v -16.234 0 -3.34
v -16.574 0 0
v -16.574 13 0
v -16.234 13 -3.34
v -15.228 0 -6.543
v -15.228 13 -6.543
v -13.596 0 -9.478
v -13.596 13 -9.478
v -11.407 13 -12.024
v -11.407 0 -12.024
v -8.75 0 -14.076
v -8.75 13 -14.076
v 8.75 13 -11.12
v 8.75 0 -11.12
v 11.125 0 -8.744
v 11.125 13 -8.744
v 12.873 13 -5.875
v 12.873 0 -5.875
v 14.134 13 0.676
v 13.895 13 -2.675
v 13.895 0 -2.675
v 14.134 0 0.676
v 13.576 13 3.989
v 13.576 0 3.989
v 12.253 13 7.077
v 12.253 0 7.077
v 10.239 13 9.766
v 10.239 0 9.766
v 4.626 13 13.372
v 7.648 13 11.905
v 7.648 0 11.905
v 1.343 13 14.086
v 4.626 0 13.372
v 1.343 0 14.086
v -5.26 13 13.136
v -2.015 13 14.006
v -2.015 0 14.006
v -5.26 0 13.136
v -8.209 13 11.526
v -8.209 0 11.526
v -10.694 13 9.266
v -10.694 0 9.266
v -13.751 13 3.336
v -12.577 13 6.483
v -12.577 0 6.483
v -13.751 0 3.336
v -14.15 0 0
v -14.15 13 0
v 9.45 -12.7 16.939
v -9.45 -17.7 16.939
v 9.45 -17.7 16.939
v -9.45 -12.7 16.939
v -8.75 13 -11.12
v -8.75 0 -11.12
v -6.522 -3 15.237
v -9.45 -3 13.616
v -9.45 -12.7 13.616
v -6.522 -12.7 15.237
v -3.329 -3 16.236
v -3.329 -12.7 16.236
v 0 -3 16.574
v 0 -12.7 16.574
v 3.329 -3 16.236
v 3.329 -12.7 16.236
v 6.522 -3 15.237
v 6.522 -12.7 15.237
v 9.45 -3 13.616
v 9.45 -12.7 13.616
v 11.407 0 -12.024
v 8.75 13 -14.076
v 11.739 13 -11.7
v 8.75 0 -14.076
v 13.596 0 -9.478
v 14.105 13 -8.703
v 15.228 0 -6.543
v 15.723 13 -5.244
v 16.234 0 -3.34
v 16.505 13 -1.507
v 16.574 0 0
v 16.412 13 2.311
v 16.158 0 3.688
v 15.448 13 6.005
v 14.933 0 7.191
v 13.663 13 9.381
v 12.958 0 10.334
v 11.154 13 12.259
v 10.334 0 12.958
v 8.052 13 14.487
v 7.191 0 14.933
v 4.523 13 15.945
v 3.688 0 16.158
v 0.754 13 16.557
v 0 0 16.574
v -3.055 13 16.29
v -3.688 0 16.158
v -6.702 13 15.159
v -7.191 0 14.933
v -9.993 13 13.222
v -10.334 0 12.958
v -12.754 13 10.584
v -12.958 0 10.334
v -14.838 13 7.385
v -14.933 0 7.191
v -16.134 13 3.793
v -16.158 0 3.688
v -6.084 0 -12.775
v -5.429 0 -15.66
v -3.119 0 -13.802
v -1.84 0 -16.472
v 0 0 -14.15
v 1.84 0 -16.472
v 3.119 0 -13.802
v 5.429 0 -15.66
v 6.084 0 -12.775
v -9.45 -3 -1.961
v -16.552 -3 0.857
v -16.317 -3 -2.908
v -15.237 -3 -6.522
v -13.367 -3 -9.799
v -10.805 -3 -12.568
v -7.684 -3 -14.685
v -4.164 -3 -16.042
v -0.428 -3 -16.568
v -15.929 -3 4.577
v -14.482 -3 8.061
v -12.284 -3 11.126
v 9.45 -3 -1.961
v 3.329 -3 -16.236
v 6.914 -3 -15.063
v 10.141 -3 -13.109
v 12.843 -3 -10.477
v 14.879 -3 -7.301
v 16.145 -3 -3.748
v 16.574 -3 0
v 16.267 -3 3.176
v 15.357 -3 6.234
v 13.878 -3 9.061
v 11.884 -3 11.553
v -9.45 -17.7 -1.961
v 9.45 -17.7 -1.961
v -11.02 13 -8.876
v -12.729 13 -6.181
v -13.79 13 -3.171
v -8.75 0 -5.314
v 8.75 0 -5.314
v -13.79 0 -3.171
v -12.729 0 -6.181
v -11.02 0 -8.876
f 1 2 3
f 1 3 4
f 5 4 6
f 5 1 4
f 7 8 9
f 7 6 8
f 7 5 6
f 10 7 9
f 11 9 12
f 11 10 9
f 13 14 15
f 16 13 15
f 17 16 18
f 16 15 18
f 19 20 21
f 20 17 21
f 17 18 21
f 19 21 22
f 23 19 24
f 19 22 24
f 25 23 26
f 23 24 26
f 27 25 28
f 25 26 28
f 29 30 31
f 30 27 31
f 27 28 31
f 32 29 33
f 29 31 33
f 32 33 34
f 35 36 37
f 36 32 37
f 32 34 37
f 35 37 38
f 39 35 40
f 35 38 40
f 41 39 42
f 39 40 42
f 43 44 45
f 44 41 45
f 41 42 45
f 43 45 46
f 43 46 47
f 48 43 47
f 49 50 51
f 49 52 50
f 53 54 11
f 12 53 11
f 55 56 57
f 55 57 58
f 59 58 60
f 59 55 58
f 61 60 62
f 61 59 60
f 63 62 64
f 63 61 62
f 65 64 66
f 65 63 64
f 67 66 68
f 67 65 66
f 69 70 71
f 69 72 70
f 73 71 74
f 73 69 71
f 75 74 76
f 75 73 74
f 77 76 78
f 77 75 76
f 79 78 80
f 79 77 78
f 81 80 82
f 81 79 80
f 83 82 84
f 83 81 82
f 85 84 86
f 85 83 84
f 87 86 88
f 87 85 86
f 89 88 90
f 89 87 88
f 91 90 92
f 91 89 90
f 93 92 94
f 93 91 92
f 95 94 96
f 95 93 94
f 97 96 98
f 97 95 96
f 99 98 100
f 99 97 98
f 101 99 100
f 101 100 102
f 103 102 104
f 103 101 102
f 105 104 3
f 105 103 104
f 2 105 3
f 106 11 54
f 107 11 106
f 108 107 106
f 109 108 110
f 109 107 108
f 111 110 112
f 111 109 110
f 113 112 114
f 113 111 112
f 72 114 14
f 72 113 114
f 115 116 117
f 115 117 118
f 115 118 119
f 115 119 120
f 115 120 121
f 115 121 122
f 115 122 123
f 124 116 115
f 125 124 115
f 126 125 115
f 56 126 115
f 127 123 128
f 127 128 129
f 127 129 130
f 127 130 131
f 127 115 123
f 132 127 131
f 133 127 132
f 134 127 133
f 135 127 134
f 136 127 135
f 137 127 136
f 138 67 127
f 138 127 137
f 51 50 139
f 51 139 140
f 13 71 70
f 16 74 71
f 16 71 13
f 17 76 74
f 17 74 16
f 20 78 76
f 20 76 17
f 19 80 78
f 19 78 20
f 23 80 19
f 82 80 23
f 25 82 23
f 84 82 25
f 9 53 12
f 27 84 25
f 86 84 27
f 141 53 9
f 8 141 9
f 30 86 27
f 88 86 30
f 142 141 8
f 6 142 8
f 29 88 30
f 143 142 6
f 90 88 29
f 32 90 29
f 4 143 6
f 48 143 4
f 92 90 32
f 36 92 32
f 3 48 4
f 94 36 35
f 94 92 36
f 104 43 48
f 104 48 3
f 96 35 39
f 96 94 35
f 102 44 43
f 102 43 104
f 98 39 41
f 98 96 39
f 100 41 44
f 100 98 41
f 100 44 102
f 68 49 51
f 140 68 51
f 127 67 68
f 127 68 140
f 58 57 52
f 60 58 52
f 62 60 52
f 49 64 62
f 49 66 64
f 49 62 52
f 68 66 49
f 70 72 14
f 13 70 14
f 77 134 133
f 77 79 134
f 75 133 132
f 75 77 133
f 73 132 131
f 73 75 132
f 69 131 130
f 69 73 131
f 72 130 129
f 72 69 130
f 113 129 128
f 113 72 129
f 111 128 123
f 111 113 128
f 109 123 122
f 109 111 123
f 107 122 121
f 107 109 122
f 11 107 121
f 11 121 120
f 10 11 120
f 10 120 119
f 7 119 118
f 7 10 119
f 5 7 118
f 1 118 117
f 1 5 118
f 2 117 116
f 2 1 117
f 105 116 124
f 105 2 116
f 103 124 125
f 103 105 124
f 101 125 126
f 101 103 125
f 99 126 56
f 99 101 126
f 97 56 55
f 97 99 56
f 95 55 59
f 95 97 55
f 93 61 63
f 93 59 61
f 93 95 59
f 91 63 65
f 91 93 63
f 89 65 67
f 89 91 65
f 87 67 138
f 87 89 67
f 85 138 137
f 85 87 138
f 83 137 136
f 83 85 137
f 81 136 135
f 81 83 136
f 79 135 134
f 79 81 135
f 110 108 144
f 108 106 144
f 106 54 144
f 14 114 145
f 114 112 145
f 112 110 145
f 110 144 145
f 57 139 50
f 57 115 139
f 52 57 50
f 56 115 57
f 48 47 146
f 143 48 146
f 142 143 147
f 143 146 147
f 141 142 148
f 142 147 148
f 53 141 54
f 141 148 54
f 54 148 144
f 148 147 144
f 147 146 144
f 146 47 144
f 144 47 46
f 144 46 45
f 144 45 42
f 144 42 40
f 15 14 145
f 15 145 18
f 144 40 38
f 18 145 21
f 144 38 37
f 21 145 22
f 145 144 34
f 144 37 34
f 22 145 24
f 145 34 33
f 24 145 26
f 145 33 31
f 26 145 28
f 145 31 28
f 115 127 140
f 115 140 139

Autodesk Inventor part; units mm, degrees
ref_plane "YZ Plane" through (0, 0, 0) normal (1, 0, 0) x (0, 1, 0)
ref_plane "XZ Plane" through (0, 0, 0) normal (0, 1, 0) x (-1, 0, 0)
ref_plane "XY Plane" through (0, 0, 0) normal (0, 0, 1) x (1, 0, 0)
sketch "Sketch1" plane through (0, 0, 0) normal (0, 1, 0) x (-1, 0, 0)
  circle A0 centre (0, 0) radius 14.15
  circle A1 centre (0, 0) radius 16.574
  dimension "d0" = 28.3
  dimension "d1" = 2.424
extrude "Extrusion1" add sketch "Sketch1" along normal blind 13
sketch "Sketch2" plane through (0, 0, 0) normal (0, -1, 0) x (1, 0, 0)
  circle A0 centre (0, 0) radius 16.574 projected
extrude "Extrusion2" add sketch "Sketch2" along normal blind 3
sketch "Sketch3" plane through (0, 13, 0) normal (0, 1, 0) x (1, 0, 0)
  line L0 (0, 16.574) -> (-8.75, 16.574)
  line L1 (-8.75, 16.574) -> (8.75, 16.574)
  line L2 (-8.75, 16.574) -> (8.75, 16.574)
  line L3 (8.75, 16.574) -> (8.75, 5.314)
  line L4 (8.75, 5.314) -> (-8.75, 5.314)
  line L5 (-8.75, 5.314) -> (-8.75, 16.574)
  dimension "d6" = 8.75
  dimension "d7" = 17.5
extrude "Extrusion3" cut sketch "Sketch3" against normal up to surface (13 mm away)
sketch "Sketch4" plane through (0, -3, 0) normal (0, -1, 0) x (1, 0, 0)
  arc A0 (8.75, -14.076) -> (-8.75, -14.076) centre (0, 0) ccw projected
  line L0 (0, 16.574) -> (0, 2.9438)
  line L1 (0, 2.9438) -> (0, 12.0338)
  line L2 (-9.45, -1.9612) -> (-9.45, 16.9388)
  line L3 (-9.45, 16.9388) -> (9.45, 16.9388)
  line L4 (9.45, 16.9388) -> (9.45, -1.9612)
  line L5 (9.45, -1.9612) -> (-9.45, -1.9612)
  point P0 (0.0791, 7.4888)
  point P1 (0, 7.4888)
  point P2 (0, -1.9612)
  dimension "d13" = 18.9
extrude "Extrusion4" add sketch "Sketch4" along normal blind 14.7
sketch "Sketch5" plane through (0, -3, 0) normal (0, 1, 0) x (1, 0, 0)
  arc A0 (-9.45, -13.616) -> (9.45, -13.616) centre (0, 0) ccw projected
  line L0 (-9.45, -13.616) -> (-9.45, -16.9388) projected
  line L1 (-9.45, -16.9388) -> (9.45, -16.9388) projected
  line L2 (9.45, -16.9388) -> (9.45, -13.616) projected
extrude "Extrusion5" cut sketch "Sketch5" against normal blind 9.7
properties part number "stepper_housing"
